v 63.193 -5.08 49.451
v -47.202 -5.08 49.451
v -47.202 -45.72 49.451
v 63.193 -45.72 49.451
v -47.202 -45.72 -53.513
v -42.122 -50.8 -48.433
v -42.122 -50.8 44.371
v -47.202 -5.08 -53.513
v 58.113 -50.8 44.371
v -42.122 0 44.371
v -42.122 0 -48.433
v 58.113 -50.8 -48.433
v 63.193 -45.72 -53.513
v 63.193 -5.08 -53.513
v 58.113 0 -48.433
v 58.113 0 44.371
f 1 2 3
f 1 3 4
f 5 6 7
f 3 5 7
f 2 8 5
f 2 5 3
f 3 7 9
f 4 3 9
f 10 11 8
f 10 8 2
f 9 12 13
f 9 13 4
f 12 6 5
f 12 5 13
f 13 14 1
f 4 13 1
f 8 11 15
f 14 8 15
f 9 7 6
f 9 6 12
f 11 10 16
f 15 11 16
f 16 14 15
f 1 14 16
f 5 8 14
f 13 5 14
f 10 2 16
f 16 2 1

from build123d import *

# Parameters (mm, degrees)
F0_W     = 110.394865
F0_H     = 102.963418
F1_DEPTH = 50.8
F2_SIZE  = 5.08
F3_SIZE2 = 5.08
F3_SIZE  = 5.08


with BuildPart() as f1:
    # F0 (on Front) → F1 (new body)
    with BuildSketch(Plane.XZ):
        with Locations((7.995776, -2.030991)):
            Rectangle(F0_W, F0_H)
    extrude(amount=F1_DEPTH)

    # F2
    f2_edges = [f1.edges().sort_by_distance(p)[0] for p in [
        (7.995777, -50.8, 49.450718),
        (-47.201656, -50.8, -2.030991),
        (7.995777, -50.8, -53.5127),
        (63.193209, -50.8, -2.030991),
    ]]
    chamfer(f2_edges, length=F2_SIZE)

    # F3
    f3_edges = [f1.edges().sort_by_distance(p)[0] for p in [
        (7.995777, 0, 49.450718),
        (-47.201656, 0, -2.030991),
        (7.995777, 0, -53.5127),
        (63.193209, 0, -2.030991),
    ]]
    chamfer(f3_edges, length=F3_SIZE, length2=F3_SIZE2)


solid = f1.part
